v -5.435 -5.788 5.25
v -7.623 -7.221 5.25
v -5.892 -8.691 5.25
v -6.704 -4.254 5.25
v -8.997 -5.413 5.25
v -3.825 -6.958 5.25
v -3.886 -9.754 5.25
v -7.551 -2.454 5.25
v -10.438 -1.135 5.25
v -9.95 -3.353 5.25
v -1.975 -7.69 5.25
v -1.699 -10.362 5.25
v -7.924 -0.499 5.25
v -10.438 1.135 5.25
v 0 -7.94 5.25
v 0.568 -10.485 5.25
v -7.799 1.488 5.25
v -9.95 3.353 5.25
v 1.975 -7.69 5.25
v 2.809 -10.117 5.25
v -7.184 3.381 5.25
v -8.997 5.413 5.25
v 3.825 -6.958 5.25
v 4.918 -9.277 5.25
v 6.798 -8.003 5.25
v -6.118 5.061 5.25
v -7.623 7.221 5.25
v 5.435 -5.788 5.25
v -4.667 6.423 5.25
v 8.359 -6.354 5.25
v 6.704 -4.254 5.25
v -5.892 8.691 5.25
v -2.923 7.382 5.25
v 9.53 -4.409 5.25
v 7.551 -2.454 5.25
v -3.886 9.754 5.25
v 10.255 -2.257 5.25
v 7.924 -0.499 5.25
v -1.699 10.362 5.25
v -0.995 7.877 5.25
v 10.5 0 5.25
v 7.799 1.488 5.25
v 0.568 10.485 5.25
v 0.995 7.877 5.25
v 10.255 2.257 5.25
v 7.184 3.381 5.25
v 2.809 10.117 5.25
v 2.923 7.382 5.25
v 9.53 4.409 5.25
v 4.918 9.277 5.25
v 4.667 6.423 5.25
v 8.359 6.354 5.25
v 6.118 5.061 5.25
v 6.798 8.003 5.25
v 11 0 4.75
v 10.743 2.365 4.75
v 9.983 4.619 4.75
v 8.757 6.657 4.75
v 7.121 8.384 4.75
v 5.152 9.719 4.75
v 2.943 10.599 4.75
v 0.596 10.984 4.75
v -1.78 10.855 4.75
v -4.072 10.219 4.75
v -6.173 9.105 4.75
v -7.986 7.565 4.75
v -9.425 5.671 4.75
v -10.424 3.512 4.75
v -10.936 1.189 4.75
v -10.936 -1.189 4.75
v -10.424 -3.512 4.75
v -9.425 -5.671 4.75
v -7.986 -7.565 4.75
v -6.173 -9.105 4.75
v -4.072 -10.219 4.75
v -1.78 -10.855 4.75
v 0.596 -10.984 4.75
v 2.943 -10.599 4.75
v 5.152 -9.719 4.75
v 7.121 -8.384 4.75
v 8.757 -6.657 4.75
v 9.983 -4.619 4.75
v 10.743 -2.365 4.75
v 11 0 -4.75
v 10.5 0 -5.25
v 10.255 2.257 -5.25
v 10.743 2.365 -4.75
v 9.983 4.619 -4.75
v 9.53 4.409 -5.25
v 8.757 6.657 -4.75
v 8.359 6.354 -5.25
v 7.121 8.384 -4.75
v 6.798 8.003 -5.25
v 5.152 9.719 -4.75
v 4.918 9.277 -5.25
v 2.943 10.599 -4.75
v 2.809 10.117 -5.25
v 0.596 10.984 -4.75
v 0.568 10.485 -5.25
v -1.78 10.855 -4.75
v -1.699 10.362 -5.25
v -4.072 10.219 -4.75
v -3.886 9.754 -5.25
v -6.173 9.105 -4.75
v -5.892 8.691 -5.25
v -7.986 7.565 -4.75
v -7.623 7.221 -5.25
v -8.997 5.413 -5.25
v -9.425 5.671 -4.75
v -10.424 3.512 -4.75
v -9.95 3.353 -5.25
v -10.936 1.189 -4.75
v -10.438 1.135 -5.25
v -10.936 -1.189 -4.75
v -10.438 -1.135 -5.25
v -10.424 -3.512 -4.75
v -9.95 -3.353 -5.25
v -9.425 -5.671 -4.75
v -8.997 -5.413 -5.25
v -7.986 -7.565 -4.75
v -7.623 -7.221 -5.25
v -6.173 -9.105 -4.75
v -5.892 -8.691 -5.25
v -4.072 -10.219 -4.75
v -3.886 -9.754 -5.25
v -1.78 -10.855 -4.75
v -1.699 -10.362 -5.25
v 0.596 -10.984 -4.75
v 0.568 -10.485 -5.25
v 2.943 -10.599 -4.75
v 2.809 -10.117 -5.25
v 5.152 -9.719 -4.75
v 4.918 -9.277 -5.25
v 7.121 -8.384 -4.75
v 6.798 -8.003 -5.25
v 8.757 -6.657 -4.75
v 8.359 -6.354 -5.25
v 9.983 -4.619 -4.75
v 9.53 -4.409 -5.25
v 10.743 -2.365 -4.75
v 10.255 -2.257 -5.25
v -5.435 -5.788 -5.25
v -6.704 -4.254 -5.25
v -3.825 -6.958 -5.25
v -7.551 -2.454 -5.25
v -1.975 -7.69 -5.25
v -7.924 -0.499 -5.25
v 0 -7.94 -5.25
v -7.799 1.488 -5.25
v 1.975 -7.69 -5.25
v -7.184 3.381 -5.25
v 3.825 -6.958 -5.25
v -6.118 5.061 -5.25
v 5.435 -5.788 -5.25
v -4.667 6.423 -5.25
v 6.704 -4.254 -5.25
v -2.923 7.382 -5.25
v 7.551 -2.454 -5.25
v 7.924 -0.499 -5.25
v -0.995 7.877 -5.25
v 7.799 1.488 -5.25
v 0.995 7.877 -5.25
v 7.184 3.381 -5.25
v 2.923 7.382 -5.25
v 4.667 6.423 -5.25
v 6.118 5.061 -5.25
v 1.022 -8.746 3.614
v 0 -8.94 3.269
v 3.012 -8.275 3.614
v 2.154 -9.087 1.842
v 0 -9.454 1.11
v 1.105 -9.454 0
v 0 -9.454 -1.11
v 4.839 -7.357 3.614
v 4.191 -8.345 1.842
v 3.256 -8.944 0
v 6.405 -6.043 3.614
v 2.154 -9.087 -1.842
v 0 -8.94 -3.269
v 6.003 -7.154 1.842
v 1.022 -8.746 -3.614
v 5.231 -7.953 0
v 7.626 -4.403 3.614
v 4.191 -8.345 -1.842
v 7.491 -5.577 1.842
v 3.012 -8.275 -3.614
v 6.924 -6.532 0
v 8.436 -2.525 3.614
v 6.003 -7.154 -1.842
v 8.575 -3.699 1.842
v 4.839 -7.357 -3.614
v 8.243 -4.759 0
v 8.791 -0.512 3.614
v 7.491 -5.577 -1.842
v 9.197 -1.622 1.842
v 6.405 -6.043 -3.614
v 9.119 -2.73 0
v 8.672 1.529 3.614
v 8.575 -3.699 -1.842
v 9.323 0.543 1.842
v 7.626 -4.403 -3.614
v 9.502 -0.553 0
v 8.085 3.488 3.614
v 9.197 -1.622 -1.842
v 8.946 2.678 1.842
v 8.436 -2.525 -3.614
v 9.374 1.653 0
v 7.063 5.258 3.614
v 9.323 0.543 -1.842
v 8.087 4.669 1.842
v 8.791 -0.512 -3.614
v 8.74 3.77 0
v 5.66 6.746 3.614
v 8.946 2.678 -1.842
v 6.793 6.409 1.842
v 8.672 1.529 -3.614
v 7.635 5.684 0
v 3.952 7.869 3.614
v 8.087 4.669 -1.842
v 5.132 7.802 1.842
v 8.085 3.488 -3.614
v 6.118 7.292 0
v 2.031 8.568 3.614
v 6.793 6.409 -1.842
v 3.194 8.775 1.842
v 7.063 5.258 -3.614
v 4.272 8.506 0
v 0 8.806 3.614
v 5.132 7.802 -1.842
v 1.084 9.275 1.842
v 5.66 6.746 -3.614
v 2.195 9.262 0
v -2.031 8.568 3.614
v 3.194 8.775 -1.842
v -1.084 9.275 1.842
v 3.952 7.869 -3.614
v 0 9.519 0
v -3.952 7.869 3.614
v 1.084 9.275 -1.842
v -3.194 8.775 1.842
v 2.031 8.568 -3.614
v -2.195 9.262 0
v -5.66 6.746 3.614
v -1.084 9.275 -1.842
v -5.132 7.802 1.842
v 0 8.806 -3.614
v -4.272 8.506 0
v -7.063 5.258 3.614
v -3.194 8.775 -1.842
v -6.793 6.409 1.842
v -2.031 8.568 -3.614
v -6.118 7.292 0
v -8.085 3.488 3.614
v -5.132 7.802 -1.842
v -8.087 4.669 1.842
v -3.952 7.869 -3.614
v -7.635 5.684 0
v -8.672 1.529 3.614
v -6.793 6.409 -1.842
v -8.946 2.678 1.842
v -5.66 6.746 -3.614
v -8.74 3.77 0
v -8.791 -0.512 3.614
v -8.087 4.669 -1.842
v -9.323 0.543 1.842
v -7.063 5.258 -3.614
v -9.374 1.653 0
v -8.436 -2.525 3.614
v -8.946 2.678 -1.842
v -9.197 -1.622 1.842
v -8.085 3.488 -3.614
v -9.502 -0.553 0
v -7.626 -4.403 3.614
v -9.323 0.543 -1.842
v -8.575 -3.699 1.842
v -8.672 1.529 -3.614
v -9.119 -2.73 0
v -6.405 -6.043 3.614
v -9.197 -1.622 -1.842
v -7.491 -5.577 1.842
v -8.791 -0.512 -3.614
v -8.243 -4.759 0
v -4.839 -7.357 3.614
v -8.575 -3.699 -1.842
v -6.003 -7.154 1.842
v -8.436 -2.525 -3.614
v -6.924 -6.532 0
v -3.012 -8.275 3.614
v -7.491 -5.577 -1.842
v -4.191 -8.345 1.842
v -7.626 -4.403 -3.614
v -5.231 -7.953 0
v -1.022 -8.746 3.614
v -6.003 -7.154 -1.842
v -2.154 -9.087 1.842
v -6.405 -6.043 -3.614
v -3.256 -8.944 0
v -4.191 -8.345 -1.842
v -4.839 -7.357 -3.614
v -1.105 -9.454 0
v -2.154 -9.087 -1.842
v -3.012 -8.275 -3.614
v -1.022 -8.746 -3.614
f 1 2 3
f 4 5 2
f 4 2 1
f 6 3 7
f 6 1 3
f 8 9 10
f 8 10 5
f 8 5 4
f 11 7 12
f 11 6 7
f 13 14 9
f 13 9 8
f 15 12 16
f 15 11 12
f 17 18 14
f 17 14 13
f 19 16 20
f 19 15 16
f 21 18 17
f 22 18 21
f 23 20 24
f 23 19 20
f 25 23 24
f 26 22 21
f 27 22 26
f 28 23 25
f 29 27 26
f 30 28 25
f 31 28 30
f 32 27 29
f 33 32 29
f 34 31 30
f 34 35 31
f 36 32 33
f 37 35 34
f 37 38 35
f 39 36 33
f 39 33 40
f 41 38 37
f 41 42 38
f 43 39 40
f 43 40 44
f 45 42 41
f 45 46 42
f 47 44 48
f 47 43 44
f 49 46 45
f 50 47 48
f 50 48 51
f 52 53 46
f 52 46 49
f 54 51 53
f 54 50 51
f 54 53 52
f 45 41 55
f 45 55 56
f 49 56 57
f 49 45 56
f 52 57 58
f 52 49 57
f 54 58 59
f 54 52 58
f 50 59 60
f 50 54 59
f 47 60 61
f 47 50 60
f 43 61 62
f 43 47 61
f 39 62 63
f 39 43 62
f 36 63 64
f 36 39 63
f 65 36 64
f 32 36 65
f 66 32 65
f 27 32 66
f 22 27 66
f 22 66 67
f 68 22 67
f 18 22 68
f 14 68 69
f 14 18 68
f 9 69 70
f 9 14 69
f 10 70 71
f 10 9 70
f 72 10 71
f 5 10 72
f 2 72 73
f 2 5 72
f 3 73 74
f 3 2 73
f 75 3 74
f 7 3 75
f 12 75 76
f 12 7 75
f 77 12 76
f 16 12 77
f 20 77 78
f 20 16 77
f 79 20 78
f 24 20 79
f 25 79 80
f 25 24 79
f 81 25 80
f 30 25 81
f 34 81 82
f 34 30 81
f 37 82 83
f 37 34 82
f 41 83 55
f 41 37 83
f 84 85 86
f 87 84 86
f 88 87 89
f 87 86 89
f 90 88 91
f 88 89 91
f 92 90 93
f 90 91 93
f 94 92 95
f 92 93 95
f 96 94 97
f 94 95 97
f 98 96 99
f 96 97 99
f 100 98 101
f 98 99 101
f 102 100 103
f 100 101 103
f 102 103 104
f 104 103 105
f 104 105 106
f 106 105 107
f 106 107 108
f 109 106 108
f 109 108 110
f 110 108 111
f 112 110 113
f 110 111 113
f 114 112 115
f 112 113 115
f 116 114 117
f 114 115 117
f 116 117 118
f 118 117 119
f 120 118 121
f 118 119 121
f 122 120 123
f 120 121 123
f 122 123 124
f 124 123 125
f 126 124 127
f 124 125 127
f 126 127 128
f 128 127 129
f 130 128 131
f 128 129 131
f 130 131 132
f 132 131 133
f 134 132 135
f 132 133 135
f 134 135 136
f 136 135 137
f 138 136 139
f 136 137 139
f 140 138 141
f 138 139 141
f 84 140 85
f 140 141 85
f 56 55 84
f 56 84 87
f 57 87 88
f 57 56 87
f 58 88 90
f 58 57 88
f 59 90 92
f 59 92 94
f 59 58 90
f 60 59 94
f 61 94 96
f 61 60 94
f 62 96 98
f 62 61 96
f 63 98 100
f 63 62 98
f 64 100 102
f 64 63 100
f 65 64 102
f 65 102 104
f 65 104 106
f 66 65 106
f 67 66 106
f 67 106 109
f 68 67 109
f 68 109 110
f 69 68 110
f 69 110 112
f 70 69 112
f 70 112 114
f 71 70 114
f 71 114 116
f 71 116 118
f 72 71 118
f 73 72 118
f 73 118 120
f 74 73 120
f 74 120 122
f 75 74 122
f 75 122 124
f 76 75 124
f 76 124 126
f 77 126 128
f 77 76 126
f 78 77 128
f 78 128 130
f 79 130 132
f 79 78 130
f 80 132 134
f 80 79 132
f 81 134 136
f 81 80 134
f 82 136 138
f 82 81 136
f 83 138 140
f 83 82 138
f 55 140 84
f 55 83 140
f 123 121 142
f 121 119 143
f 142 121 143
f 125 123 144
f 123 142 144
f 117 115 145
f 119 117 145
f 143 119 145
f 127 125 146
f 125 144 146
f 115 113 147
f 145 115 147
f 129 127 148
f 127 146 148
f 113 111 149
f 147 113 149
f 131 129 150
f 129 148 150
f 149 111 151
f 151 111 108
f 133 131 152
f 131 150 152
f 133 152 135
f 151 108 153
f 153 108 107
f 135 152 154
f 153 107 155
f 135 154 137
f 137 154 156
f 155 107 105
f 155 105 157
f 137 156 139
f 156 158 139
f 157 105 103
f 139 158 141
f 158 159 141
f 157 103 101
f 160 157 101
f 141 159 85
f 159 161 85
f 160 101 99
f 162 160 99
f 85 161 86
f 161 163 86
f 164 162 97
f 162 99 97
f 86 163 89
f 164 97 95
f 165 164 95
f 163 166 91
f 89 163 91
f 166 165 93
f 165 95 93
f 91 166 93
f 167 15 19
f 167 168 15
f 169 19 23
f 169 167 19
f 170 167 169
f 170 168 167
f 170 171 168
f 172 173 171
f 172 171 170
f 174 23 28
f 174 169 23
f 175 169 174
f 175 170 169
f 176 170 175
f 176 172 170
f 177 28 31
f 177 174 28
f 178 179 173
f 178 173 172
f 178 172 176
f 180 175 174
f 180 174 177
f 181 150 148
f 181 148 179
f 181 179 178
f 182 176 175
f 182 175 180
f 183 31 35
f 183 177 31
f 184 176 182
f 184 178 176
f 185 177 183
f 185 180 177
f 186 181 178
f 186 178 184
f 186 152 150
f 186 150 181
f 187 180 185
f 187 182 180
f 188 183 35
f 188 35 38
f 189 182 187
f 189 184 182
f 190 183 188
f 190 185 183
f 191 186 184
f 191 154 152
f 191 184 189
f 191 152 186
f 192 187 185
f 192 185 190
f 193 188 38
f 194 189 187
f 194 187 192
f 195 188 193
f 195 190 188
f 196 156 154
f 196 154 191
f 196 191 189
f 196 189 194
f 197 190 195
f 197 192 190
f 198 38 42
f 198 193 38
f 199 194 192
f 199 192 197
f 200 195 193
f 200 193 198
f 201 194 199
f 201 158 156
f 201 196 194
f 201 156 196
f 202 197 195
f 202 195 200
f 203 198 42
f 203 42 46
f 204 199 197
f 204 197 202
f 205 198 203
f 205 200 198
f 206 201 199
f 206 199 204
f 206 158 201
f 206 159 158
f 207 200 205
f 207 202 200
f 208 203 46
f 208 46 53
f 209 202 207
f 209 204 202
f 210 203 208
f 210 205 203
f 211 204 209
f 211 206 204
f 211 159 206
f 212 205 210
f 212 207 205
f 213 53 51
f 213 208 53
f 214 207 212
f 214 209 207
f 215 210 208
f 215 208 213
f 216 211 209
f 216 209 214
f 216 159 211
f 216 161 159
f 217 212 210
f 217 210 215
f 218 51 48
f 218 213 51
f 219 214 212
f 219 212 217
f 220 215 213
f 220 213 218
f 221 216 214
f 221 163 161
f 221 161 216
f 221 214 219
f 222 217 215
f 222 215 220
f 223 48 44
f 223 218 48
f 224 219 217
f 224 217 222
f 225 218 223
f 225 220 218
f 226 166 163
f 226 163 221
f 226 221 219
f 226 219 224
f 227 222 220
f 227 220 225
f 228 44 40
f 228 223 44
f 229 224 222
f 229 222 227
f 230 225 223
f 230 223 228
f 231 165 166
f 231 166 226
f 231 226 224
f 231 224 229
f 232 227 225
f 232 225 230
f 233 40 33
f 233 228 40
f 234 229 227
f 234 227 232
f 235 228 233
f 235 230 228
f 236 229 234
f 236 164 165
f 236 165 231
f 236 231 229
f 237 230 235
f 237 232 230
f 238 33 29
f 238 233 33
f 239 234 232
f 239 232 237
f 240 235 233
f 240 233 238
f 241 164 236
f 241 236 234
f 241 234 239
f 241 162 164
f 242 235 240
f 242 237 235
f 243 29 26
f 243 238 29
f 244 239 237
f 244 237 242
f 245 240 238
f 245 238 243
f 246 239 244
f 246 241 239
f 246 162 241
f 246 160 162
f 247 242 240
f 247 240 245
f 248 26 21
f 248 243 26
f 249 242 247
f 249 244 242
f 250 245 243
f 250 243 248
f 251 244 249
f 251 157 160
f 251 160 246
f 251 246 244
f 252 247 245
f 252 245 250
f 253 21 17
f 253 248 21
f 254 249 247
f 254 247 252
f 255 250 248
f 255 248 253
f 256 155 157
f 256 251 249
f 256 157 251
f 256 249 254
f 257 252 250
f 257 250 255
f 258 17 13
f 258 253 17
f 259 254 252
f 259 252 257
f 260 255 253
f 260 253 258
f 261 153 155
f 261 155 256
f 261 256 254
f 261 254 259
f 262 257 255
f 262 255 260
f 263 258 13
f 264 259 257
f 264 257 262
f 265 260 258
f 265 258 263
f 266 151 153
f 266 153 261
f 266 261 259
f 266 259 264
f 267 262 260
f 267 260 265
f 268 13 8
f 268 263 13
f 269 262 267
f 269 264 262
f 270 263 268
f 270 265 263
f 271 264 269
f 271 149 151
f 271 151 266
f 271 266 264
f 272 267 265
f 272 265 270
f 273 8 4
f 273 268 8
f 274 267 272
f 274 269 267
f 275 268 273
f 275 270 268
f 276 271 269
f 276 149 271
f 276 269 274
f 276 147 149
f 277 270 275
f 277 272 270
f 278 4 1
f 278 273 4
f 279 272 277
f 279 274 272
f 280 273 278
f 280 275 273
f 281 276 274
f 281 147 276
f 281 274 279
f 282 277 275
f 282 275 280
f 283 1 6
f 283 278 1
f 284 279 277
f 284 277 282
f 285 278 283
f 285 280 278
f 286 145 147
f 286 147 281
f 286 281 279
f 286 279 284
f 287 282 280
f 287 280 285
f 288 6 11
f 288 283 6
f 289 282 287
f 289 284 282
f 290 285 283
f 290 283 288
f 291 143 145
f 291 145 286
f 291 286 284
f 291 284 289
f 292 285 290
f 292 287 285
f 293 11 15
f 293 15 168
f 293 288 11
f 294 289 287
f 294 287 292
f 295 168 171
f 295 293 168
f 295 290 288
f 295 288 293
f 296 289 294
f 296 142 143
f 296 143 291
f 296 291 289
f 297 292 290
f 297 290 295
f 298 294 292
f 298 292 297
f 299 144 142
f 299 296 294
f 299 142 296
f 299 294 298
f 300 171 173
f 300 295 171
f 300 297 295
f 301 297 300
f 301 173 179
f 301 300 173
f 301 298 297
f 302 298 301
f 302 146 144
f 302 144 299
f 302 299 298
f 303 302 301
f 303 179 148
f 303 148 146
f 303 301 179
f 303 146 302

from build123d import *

# Parameters (mm, degrees)
SKETCH2_R           = 11
BOSS_EXTRUDE1_DEPTH = 5.25
CHAMFER1_SIZE       = 0.5


with BuildPart() as part:
    # Sketch2 → Boss-Extrude1 (new body, symmetric)
    with BuildSketch(Plane.XY):
        Circle(SKETCH2_R)
    extrude(amount=BOSS_EXTRUDE1_DEPTH, both=True)

    # Sketch4 → Cut-Revolve1 (revolve, cut)
    with BuildSketch(Plane(origin=(0, 0, 0), x_dir=(0, 0, -1), z_dir=(1, 0, 0))):
        with BuildLine():
            Line((7, -6.45), (7, 0))
            Line((7, 0), (-7, 0))
            Line((-7, 0), (-7, -6.45))
            ThreePointArc((-7, -6.45), (0, -9.518534551), (7, -6.45))
        make_face()
    revolve(axis=Axis((0, 0, -7), (0, 0, 1)), mode=Mode.SUBTRACT)

    # Chamfer1
    chamfer1_edges = [part.edges().sort_by_distance(p)[0] for p in [
        (-11, 0, -5.25),
        (-11, 0, 5.25),
    ]]
    chamfer(chamfer1_edges, length=CHAMFER1_SIZE)


solid = part.part
